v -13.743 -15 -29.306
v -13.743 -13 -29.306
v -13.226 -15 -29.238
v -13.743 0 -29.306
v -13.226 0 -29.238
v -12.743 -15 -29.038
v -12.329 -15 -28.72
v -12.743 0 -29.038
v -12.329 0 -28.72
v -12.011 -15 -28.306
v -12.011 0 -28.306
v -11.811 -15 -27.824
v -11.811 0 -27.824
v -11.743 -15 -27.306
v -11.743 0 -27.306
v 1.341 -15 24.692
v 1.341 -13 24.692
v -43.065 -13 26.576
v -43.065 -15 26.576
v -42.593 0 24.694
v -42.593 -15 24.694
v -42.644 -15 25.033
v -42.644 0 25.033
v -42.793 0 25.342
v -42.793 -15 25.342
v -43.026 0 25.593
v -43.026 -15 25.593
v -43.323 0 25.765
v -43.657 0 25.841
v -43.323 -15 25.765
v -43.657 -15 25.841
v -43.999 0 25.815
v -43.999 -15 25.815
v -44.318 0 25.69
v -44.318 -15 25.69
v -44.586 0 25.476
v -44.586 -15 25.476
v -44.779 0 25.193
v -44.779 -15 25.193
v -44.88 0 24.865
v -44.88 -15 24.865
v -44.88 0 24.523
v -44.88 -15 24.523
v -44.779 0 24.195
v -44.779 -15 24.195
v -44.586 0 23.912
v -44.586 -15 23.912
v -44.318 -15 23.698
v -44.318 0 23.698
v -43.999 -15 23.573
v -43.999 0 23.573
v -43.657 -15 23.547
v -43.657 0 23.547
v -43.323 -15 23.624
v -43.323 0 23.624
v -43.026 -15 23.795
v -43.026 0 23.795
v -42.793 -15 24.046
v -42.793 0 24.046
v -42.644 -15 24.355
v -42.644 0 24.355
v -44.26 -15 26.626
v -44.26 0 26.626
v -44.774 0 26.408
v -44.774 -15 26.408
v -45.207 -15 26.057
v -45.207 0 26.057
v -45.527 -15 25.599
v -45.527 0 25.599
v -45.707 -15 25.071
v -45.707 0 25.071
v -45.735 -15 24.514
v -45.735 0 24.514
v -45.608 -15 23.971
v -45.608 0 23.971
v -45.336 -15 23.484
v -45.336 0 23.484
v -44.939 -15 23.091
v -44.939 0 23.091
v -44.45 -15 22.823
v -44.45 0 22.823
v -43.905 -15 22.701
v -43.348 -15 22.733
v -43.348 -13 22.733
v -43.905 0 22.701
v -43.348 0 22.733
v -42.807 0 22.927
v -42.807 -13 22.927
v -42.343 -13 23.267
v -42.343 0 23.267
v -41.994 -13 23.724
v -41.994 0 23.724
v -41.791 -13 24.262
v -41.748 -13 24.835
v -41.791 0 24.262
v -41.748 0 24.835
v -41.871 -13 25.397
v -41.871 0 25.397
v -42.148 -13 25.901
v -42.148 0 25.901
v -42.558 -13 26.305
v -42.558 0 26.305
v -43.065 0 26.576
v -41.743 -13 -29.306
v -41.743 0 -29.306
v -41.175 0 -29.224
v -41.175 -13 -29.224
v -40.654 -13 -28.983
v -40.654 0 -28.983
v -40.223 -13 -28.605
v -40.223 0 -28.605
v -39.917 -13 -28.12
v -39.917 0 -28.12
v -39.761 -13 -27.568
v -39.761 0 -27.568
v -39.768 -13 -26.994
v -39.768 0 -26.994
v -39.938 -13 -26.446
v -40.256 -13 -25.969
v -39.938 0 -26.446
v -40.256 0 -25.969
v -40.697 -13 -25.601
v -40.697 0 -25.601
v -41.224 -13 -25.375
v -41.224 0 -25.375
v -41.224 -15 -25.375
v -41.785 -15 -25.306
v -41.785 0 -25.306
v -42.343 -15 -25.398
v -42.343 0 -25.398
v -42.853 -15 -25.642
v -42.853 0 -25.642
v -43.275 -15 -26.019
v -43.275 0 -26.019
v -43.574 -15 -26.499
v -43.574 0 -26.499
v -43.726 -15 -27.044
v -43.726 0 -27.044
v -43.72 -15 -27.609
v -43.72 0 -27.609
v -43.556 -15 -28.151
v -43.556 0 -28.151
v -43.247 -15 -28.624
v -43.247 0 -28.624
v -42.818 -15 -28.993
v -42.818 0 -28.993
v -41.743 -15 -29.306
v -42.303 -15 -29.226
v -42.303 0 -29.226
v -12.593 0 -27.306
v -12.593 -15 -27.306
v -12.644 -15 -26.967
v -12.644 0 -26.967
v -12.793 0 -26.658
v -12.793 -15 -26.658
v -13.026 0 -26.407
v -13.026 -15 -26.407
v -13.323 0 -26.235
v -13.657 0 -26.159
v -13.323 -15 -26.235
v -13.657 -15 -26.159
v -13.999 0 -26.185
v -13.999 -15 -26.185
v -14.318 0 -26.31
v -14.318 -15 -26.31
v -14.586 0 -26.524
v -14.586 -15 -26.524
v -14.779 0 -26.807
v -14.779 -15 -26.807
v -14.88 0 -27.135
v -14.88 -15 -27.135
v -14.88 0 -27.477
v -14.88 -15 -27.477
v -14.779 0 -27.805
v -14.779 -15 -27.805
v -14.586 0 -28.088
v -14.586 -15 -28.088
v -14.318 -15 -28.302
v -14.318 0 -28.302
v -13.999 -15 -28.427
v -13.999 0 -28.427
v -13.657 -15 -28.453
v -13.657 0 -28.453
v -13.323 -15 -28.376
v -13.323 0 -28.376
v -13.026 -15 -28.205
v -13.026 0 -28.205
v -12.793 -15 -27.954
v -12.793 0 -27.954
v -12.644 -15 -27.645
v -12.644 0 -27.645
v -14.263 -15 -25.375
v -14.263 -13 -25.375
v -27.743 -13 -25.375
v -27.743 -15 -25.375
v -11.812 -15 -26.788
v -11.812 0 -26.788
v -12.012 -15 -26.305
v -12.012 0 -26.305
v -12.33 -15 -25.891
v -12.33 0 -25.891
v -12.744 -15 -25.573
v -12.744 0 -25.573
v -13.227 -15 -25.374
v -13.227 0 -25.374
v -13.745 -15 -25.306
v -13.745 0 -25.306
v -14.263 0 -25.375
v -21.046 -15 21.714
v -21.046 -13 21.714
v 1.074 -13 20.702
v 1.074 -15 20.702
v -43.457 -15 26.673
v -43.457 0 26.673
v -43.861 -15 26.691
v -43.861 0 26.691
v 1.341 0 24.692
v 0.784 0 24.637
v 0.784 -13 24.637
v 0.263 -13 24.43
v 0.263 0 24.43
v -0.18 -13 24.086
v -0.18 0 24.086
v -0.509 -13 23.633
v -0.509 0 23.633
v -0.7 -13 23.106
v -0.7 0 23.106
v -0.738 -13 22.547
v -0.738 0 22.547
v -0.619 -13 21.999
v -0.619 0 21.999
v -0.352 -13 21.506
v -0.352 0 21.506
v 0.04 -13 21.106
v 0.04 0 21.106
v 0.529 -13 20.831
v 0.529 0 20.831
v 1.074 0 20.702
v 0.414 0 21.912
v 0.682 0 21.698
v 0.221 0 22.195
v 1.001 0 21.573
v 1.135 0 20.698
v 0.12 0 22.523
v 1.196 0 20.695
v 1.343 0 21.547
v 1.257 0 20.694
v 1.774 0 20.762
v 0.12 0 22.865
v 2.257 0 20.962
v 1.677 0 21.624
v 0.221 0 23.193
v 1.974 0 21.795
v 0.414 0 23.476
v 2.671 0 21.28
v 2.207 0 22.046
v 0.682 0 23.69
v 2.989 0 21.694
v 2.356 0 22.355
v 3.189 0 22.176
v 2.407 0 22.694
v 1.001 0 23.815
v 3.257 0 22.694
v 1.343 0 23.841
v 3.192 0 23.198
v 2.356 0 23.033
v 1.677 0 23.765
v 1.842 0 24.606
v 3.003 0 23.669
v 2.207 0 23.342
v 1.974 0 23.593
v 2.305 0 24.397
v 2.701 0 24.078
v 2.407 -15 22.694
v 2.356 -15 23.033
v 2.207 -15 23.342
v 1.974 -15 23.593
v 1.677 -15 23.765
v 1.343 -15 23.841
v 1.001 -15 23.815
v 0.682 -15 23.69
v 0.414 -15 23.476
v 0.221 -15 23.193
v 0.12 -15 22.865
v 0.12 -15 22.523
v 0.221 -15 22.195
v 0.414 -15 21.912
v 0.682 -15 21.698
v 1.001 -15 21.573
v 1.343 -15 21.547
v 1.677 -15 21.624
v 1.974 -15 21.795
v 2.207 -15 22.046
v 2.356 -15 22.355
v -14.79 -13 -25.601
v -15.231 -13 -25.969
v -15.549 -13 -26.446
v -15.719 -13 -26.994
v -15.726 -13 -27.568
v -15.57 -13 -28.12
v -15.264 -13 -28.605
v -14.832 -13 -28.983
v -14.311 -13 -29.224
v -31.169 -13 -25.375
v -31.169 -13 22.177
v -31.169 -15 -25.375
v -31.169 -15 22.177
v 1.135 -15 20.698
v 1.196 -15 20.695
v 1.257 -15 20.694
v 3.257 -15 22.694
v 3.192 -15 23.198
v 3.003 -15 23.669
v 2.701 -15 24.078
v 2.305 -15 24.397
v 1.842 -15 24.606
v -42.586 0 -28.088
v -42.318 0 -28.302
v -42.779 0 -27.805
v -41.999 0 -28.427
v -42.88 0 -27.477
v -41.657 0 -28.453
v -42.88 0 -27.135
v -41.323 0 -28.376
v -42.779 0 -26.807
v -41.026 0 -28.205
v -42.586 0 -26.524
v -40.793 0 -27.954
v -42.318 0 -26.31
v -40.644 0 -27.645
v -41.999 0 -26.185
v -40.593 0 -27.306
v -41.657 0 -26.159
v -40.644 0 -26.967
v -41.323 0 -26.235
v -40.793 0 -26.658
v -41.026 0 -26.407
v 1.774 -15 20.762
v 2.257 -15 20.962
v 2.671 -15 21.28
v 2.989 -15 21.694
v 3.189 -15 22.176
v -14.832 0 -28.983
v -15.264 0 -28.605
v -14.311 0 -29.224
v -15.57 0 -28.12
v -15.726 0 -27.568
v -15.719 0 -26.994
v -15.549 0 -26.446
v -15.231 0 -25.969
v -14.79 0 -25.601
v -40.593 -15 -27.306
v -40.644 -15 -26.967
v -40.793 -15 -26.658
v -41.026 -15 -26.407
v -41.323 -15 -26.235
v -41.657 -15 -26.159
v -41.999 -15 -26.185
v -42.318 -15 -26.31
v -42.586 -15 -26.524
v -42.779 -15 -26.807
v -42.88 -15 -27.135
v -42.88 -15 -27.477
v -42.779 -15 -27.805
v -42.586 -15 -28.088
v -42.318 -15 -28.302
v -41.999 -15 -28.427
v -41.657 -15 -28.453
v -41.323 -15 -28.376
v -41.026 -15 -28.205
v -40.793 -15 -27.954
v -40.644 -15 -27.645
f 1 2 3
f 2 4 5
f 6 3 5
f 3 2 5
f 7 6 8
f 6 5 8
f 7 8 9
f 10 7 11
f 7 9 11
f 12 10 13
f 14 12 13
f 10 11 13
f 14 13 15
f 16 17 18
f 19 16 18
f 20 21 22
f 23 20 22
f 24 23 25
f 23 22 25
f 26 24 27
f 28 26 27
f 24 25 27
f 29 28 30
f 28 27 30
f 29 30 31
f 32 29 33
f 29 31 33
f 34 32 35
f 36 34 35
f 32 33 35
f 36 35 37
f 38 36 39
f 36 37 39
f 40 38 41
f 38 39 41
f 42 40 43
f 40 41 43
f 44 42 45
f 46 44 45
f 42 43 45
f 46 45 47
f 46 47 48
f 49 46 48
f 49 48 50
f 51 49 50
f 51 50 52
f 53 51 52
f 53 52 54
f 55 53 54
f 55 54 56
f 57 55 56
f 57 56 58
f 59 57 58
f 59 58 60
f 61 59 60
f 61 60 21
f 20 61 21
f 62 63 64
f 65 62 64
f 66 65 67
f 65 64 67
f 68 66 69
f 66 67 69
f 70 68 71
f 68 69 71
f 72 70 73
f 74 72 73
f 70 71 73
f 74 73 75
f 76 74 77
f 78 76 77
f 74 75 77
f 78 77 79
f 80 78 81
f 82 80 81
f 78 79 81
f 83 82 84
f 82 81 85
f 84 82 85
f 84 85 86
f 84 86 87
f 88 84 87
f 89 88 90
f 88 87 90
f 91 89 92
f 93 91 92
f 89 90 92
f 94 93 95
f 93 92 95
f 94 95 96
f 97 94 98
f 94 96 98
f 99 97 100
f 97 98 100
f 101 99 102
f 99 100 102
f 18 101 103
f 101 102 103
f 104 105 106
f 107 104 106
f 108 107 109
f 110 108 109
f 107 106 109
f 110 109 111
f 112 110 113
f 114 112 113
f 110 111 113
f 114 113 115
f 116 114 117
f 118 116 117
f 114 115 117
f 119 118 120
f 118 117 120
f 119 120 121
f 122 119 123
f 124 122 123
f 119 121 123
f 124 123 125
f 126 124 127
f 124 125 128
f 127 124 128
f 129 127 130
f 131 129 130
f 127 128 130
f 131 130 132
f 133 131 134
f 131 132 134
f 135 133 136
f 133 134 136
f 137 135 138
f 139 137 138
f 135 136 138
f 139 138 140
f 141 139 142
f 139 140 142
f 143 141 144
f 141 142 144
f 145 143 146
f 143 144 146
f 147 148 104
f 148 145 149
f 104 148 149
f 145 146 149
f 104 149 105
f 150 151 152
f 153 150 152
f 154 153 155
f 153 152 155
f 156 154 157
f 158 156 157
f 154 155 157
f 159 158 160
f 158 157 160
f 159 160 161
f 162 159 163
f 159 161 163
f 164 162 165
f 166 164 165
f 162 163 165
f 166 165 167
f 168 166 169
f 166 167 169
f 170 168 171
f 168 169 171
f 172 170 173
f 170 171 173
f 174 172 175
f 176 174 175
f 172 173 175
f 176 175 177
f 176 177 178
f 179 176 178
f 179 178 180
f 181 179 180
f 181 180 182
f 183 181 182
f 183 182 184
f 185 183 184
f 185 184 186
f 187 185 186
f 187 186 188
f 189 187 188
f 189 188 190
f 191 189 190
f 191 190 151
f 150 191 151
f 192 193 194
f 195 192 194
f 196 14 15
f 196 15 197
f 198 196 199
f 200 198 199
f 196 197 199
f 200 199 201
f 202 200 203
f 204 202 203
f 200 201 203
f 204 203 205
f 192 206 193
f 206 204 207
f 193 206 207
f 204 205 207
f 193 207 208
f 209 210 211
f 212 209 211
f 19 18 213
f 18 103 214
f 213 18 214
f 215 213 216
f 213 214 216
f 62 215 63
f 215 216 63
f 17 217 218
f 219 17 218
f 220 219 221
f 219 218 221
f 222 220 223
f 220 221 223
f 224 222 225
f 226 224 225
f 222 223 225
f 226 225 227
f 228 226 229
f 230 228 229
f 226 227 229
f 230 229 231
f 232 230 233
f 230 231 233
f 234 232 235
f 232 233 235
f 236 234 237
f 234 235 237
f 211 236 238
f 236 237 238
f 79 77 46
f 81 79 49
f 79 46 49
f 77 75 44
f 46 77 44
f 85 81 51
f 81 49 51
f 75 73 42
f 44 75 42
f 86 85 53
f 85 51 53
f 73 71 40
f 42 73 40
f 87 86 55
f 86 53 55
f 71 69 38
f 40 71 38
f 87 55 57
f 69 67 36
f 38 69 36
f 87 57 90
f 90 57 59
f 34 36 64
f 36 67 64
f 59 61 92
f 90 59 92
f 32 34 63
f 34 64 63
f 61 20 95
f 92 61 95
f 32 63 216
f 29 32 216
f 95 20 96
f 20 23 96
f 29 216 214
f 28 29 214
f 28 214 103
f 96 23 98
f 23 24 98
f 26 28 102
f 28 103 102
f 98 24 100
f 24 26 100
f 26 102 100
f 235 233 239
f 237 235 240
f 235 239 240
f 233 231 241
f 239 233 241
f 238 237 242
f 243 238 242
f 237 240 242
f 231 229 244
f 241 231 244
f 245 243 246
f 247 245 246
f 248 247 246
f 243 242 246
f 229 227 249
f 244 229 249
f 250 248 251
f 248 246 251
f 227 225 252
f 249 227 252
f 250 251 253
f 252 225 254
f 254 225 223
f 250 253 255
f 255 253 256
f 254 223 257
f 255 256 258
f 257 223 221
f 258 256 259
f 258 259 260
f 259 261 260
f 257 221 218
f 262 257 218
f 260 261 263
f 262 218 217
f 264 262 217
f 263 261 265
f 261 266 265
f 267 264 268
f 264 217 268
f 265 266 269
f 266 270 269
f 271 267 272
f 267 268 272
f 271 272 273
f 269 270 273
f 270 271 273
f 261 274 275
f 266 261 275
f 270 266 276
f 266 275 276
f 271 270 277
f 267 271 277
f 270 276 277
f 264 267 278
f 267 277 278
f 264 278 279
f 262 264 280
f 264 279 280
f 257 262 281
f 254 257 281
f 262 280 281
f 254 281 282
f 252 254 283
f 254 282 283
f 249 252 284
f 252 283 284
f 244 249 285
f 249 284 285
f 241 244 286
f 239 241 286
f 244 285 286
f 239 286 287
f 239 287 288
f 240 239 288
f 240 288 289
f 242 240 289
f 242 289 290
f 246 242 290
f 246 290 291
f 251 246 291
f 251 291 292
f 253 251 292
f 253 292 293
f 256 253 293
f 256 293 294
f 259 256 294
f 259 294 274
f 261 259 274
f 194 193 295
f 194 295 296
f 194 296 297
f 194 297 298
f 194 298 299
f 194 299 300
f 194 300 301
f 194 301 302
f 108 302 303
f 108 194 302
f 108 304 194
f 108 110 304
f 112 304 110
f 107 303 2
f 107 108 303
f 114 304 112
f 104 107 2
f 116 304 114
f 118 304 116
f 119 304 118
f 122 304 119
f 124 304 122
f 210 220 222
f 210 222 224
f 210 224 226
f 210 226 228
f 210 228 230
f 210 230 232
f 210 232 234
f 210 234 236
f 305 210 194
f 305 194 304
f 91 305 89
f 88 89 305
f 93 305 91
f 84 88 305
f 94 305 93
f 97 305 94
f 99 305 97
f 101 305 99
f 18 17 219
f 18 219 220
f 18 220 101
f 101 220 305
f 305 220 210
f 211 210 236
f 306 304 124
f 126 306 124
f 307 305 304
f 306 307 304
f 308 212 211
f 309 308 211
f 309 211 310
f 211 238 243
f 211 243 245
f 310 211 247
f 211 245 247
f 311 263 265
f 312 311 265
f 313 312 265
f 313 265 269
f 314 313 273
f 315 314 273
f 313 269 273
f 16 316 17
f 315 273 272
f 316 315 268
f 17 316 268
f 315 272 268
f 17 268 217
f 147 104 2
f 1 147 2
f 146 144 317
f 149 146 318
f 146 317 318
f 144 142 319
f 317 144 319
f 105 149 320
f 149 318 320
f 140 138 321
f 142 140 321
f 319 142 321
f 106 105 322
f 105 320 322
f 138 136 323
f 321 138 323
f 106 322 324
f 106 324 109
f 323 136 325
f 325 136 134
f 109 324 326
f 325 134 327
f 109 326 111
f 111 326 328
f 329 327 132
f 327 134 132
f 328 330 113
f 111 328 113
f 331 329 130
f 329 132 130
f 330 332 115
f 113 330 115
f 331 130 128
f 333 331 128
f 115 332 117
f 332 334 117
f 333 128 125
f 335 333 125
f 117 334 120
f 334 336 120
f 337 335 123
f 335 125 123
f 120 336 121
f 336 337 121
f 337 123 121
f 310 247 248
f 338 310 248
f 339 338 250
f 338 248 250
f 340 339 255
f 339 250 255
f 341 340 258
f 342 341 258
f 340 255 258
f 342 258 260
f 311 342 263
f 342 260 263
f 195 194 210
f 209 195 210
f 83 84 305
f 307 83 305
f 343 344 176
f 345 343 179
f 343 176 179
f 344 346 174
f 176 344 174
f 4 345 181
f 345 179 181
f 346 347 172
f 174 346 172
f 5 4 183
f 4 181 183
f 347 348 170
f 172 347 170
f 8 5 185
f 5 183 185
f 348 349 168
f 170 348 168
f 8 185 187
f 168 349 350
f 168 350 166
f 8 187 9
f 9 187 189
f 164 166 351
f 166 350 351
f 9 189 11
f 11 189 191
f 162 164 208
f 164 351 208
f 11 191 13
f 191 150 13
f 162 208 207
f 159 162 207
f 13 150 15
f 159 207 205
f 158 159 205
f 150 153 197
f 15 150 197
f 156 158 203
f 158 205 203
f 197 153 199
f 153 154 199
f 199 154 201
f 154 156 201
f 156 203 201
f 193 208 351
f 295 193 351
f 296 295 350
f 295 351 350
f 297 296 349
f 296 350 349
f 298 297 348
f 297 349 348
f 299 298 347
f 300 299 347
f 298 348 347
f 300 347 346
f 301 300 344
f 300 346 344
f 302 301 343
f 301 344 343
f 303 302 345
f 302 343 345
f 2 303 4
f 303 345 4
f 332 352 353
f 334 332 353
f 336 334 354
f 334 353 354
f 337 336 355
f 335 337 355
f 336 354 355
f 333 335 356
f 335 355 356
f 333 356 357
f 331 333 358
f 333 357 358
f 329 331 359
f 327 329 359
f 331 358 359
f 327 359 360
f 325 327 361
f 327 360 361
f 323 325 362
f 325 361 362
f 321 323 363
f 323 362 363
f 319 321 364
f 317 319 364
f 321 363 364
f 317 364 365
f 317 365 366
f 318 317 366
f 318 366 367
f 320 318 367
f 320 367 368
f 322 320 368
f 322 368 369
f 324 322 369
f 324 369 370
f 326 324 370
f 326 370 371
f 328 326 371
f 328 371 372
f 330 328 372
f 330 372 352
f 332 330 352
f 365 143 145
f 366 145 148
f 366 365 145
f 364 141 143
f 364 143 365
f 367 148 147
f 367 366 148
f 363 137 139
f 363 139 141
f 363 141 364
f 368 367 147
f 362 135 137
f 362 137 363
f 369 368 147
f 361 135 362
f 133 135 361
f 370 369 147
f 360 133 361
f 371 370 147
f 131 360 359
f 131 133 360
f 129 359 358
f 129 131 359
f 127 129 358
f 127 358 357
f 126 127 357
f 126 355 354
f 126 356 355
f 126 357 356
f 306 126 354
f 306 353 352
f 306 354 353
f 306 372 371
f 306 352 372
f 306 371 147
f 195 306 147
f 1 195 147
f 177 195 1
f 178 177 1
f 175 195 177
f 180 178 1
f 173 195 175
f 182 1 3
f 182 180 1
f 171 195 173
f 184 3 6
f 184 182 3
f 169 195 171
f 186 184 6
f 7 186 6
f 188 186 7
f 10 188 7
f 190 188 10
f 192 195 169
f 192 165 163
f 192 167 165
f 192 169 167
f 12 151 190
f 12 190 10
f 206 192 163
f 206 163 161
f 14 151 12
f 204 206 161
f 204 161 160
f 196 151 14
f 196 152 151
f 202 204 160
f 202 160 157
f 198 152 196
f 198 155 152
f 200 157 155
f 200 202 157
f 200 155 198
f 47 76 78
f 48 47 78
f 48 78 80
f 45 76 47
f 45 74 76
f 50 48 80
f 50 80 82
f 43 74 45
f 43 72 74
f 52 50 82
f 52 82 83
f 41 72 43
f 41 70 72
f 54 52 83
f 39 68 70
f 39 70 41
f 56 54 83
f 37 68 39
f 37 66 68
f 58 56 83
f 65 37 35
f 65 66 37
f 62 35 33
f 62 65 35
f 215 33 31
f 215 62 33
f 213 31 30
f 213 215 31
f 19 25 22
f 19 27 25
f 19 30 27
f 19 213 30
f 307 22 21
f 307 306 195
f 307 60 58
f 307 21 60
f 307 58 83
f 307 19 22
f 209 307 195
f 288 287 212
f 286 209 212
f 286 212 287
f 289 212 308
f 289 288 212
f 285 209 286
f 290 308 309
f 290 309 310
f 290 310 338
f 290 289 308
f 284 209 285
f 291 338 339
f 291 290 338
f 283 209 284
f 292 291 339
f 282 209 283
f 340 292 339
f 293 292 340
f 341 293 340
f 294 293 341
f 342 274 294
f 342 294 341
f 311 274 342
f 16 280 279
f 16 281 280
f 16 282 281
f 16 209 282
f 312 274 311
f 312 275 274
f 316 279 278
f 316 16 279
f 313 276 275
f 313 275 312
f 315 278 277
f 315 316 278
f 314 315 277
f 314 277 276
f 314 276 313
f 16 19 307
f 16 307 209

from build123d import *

# Parameters (mm, degrees)
F1_DEPTH = 15
F3_DEPTH = 13
F4_R     = 1.15
F5_DEPTH = 25


with BuildPart() as f1:
    # F0 (on Front) → F1 (new body)
    with BuildSketch(Plane.XZ):
        with BuildLine():
            ThreePointArc((-41.743332, -29.305931), (-40.329118, -28.720145), (-39.743332, -27.305931))
            ThreePointArc((-39.743332, -27.305931), (-40.156088, -26.089109), (-41.223989, -25.374537))
            ThreePointArc((-41.223989, -25.374537), (-43.726106, -27.044004), (-41.743332, -29.305931))
        make_face()
        with BuildLine():
            ThreePointArc((-41.223989, -25.374537), (-40.156088, -26.089109), (-39.743332, -27.305931))
            ThreePointArc((-39.743332, -27.305931), (-40.329118, -28.720145), (-41.743332, -29.305931))
            Line((-41.743332, -29.305931), (-13.743332, -29.305931))
            ThreePointArc((-13.743332, -29.305931), (-15.726106, -27.567859), (-14.262674, -25.374537))
            Line((-14.262674, -25.374537), (-27.743332, -25.374537))
            Line((-27.743332, -25.374537), (-31.169068, -25.374537))
            Line((-31.169068, -25.374537), (-41.223989, -25.374537))
        make_face()
        Polygon((-31.169068, 22.176644), (-31.169068, -25.374537), (-27.743332, -25.374537), (-21.045742, 21.713784), align=None)
        with BuildLine():
            ThreePointArc((-14.262674, -25.374537), (-15.726106, -27.567859), (-13.743332, -29.305931))
            ThreePointArc((-13.743332, -29.305931), (-12.329118, -28.720145), (-11.743332, -27.305931))
            ThreePointArc((-11.743332, -27.305931), (-12.526509, -25.718688), (-14.262674, -25.374537))
        make_face()
        with BuildLine():
            Line((-43.348153, 22.733499), (-31.169068, 22.176644))
            Line((-31.169068, 22.176644), (-21.045742, 21.713784))
            Line((-21.045742, 21.713784), (1.074161, 20.702413))
            ThreePointArc((1.074161, 20.702413), (-0.73886, 22.827734), (1.341411, 24.692272))
            Line((1.341411, 24.692272), (-43.06501, 26.575525))
            ThreePointArc((-43.06501, 26.575525), (-42.106774, 25.843711), (-41.743332, 24.694069))
            ThreePointArc((-41.743332, 24.694069), (-42.195695, 23.427253), (-43.348153, 22.733499))
        make_face()
        with BuildLine():
            ThreePointArc((-44.259922, 26.626201), (-45.690629, 24.237962), (-43.348153, 22.733499))
            ThreePointArc((-43.348153, 22.733499), (-42.195695, 23.427253), (-41.743332, 24.694069))
            ThreePointArc((-41.743332, 24.694069), (-42.106774, 25.843711), (-43.06501, 26.575525))
            Line((-43.06501, 26.575525), (-44.259922, 26.626201))
        make_face()
        with BuildLine():
            Line((1.256668, 20.694069), (1.074161, 20.702413))
            ThreePointArc((1.074161, 20.702413), (1.165319, 20.696156), (1.256668, 20.694069))
        make_face()
        with BuildLine():
            ThreePointArc((1.341411, 24.692272), (-0.73886, 22.827734), (1.074161, 20.702413))
            Line((1.074161, 20.702413), (1.256668, 20.694069))
            ThreePointArc((1.256668, 20.694069), (2.670882, 21.279855), (3.256668, 22.694069))
            ThreePointArc((3.256668, 22.694069), (2.700532, 24.077997), (1.341411, 24.692272))
        make_face()
        with BuildLine():
            ThreePointArc((-43.06501, 26.575525), (-43.658589, 26.692272), (-44.259922, 26.626201))
            Line((-44.259922, 26.626201), (-43.06501, 26.575525))
        make_face()
    extrude(amount=F1_DEPTH)

    # F2 (on face) → F3 (cut)
    with BuildSketch(Plane(origin=(0, 0, 0), x_dir=(-1, 0, 0), z_dir=(0, 1, 0))):
        with BuildLine():
            ThreePointArc((14.262674, -25.374537), (15.726106, -27.567859), (13.743332, -29.305931))
            Line((13.743332, -29.305931), (41.743332, -29.305931))
            ThreePointArc((41.743332, -29.305931), (39.760557, -27.567859), (41.223989, -25.374537))
            Line((41.223989, -25.374537), (31.169068, -25.374537))
            Line((31.169068, -25.374537), (31.169068, 22.176644))
            Line((31.169068, 22.176644), (43.348153, 22.733499))
            ThreePointArc((43.348153, 22.733499), (41.748741, 24.547075), (43.06501, 26.575525))
            Line((43.06501, 26.575525), (-1.341411, 24.692272))
            ThreePointArc((-1.341411, 24.692272), (0.73886, 22.827734), (-1.074161, 20.702413))
            Line((-1.074161, 20.702413), (21.045742, 21.713784))
            Line((21.045742, 21.713784), (27.743332, -25.374537))
            Line((27.743332, -25.374537), (14.262674, -25.374537))
        make_face()
    extrude(amount=-F3_DEPTH, mode=Mode.SUBTRACT)

    # F4 (on face) → F5 (cut)
    with BuildSketch(Plane.XZ.offset(15)):
        with Locations((-13.743332, -27.305931)):
            Circle(F4_R)
        with Locations((-41.743332, -27.305931)):
            Circle(F4_R)
        with Locations((1.256668, 22.694069)):
            Circle(F4_R)
        with Locations((-43.743332, 24.694069)):
            Circle(F4_R)
    extrude(amount=-F5_DEPTH, mode=Mode.SUBTRACT)


solid = f1.part
